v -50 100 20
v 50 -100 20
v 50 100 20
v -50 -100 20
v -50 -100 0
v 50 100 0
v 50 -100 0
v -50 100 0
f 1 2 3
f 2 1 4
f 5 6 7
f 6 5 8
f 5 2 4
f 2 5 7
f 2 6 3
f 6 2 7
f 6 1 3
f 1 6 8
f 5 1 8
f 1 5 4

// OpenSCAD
$fn=64;
color("LightYellow"){translate(v = [-50.000, -100.000])
cube(size = [100, 200, 20]);
}
